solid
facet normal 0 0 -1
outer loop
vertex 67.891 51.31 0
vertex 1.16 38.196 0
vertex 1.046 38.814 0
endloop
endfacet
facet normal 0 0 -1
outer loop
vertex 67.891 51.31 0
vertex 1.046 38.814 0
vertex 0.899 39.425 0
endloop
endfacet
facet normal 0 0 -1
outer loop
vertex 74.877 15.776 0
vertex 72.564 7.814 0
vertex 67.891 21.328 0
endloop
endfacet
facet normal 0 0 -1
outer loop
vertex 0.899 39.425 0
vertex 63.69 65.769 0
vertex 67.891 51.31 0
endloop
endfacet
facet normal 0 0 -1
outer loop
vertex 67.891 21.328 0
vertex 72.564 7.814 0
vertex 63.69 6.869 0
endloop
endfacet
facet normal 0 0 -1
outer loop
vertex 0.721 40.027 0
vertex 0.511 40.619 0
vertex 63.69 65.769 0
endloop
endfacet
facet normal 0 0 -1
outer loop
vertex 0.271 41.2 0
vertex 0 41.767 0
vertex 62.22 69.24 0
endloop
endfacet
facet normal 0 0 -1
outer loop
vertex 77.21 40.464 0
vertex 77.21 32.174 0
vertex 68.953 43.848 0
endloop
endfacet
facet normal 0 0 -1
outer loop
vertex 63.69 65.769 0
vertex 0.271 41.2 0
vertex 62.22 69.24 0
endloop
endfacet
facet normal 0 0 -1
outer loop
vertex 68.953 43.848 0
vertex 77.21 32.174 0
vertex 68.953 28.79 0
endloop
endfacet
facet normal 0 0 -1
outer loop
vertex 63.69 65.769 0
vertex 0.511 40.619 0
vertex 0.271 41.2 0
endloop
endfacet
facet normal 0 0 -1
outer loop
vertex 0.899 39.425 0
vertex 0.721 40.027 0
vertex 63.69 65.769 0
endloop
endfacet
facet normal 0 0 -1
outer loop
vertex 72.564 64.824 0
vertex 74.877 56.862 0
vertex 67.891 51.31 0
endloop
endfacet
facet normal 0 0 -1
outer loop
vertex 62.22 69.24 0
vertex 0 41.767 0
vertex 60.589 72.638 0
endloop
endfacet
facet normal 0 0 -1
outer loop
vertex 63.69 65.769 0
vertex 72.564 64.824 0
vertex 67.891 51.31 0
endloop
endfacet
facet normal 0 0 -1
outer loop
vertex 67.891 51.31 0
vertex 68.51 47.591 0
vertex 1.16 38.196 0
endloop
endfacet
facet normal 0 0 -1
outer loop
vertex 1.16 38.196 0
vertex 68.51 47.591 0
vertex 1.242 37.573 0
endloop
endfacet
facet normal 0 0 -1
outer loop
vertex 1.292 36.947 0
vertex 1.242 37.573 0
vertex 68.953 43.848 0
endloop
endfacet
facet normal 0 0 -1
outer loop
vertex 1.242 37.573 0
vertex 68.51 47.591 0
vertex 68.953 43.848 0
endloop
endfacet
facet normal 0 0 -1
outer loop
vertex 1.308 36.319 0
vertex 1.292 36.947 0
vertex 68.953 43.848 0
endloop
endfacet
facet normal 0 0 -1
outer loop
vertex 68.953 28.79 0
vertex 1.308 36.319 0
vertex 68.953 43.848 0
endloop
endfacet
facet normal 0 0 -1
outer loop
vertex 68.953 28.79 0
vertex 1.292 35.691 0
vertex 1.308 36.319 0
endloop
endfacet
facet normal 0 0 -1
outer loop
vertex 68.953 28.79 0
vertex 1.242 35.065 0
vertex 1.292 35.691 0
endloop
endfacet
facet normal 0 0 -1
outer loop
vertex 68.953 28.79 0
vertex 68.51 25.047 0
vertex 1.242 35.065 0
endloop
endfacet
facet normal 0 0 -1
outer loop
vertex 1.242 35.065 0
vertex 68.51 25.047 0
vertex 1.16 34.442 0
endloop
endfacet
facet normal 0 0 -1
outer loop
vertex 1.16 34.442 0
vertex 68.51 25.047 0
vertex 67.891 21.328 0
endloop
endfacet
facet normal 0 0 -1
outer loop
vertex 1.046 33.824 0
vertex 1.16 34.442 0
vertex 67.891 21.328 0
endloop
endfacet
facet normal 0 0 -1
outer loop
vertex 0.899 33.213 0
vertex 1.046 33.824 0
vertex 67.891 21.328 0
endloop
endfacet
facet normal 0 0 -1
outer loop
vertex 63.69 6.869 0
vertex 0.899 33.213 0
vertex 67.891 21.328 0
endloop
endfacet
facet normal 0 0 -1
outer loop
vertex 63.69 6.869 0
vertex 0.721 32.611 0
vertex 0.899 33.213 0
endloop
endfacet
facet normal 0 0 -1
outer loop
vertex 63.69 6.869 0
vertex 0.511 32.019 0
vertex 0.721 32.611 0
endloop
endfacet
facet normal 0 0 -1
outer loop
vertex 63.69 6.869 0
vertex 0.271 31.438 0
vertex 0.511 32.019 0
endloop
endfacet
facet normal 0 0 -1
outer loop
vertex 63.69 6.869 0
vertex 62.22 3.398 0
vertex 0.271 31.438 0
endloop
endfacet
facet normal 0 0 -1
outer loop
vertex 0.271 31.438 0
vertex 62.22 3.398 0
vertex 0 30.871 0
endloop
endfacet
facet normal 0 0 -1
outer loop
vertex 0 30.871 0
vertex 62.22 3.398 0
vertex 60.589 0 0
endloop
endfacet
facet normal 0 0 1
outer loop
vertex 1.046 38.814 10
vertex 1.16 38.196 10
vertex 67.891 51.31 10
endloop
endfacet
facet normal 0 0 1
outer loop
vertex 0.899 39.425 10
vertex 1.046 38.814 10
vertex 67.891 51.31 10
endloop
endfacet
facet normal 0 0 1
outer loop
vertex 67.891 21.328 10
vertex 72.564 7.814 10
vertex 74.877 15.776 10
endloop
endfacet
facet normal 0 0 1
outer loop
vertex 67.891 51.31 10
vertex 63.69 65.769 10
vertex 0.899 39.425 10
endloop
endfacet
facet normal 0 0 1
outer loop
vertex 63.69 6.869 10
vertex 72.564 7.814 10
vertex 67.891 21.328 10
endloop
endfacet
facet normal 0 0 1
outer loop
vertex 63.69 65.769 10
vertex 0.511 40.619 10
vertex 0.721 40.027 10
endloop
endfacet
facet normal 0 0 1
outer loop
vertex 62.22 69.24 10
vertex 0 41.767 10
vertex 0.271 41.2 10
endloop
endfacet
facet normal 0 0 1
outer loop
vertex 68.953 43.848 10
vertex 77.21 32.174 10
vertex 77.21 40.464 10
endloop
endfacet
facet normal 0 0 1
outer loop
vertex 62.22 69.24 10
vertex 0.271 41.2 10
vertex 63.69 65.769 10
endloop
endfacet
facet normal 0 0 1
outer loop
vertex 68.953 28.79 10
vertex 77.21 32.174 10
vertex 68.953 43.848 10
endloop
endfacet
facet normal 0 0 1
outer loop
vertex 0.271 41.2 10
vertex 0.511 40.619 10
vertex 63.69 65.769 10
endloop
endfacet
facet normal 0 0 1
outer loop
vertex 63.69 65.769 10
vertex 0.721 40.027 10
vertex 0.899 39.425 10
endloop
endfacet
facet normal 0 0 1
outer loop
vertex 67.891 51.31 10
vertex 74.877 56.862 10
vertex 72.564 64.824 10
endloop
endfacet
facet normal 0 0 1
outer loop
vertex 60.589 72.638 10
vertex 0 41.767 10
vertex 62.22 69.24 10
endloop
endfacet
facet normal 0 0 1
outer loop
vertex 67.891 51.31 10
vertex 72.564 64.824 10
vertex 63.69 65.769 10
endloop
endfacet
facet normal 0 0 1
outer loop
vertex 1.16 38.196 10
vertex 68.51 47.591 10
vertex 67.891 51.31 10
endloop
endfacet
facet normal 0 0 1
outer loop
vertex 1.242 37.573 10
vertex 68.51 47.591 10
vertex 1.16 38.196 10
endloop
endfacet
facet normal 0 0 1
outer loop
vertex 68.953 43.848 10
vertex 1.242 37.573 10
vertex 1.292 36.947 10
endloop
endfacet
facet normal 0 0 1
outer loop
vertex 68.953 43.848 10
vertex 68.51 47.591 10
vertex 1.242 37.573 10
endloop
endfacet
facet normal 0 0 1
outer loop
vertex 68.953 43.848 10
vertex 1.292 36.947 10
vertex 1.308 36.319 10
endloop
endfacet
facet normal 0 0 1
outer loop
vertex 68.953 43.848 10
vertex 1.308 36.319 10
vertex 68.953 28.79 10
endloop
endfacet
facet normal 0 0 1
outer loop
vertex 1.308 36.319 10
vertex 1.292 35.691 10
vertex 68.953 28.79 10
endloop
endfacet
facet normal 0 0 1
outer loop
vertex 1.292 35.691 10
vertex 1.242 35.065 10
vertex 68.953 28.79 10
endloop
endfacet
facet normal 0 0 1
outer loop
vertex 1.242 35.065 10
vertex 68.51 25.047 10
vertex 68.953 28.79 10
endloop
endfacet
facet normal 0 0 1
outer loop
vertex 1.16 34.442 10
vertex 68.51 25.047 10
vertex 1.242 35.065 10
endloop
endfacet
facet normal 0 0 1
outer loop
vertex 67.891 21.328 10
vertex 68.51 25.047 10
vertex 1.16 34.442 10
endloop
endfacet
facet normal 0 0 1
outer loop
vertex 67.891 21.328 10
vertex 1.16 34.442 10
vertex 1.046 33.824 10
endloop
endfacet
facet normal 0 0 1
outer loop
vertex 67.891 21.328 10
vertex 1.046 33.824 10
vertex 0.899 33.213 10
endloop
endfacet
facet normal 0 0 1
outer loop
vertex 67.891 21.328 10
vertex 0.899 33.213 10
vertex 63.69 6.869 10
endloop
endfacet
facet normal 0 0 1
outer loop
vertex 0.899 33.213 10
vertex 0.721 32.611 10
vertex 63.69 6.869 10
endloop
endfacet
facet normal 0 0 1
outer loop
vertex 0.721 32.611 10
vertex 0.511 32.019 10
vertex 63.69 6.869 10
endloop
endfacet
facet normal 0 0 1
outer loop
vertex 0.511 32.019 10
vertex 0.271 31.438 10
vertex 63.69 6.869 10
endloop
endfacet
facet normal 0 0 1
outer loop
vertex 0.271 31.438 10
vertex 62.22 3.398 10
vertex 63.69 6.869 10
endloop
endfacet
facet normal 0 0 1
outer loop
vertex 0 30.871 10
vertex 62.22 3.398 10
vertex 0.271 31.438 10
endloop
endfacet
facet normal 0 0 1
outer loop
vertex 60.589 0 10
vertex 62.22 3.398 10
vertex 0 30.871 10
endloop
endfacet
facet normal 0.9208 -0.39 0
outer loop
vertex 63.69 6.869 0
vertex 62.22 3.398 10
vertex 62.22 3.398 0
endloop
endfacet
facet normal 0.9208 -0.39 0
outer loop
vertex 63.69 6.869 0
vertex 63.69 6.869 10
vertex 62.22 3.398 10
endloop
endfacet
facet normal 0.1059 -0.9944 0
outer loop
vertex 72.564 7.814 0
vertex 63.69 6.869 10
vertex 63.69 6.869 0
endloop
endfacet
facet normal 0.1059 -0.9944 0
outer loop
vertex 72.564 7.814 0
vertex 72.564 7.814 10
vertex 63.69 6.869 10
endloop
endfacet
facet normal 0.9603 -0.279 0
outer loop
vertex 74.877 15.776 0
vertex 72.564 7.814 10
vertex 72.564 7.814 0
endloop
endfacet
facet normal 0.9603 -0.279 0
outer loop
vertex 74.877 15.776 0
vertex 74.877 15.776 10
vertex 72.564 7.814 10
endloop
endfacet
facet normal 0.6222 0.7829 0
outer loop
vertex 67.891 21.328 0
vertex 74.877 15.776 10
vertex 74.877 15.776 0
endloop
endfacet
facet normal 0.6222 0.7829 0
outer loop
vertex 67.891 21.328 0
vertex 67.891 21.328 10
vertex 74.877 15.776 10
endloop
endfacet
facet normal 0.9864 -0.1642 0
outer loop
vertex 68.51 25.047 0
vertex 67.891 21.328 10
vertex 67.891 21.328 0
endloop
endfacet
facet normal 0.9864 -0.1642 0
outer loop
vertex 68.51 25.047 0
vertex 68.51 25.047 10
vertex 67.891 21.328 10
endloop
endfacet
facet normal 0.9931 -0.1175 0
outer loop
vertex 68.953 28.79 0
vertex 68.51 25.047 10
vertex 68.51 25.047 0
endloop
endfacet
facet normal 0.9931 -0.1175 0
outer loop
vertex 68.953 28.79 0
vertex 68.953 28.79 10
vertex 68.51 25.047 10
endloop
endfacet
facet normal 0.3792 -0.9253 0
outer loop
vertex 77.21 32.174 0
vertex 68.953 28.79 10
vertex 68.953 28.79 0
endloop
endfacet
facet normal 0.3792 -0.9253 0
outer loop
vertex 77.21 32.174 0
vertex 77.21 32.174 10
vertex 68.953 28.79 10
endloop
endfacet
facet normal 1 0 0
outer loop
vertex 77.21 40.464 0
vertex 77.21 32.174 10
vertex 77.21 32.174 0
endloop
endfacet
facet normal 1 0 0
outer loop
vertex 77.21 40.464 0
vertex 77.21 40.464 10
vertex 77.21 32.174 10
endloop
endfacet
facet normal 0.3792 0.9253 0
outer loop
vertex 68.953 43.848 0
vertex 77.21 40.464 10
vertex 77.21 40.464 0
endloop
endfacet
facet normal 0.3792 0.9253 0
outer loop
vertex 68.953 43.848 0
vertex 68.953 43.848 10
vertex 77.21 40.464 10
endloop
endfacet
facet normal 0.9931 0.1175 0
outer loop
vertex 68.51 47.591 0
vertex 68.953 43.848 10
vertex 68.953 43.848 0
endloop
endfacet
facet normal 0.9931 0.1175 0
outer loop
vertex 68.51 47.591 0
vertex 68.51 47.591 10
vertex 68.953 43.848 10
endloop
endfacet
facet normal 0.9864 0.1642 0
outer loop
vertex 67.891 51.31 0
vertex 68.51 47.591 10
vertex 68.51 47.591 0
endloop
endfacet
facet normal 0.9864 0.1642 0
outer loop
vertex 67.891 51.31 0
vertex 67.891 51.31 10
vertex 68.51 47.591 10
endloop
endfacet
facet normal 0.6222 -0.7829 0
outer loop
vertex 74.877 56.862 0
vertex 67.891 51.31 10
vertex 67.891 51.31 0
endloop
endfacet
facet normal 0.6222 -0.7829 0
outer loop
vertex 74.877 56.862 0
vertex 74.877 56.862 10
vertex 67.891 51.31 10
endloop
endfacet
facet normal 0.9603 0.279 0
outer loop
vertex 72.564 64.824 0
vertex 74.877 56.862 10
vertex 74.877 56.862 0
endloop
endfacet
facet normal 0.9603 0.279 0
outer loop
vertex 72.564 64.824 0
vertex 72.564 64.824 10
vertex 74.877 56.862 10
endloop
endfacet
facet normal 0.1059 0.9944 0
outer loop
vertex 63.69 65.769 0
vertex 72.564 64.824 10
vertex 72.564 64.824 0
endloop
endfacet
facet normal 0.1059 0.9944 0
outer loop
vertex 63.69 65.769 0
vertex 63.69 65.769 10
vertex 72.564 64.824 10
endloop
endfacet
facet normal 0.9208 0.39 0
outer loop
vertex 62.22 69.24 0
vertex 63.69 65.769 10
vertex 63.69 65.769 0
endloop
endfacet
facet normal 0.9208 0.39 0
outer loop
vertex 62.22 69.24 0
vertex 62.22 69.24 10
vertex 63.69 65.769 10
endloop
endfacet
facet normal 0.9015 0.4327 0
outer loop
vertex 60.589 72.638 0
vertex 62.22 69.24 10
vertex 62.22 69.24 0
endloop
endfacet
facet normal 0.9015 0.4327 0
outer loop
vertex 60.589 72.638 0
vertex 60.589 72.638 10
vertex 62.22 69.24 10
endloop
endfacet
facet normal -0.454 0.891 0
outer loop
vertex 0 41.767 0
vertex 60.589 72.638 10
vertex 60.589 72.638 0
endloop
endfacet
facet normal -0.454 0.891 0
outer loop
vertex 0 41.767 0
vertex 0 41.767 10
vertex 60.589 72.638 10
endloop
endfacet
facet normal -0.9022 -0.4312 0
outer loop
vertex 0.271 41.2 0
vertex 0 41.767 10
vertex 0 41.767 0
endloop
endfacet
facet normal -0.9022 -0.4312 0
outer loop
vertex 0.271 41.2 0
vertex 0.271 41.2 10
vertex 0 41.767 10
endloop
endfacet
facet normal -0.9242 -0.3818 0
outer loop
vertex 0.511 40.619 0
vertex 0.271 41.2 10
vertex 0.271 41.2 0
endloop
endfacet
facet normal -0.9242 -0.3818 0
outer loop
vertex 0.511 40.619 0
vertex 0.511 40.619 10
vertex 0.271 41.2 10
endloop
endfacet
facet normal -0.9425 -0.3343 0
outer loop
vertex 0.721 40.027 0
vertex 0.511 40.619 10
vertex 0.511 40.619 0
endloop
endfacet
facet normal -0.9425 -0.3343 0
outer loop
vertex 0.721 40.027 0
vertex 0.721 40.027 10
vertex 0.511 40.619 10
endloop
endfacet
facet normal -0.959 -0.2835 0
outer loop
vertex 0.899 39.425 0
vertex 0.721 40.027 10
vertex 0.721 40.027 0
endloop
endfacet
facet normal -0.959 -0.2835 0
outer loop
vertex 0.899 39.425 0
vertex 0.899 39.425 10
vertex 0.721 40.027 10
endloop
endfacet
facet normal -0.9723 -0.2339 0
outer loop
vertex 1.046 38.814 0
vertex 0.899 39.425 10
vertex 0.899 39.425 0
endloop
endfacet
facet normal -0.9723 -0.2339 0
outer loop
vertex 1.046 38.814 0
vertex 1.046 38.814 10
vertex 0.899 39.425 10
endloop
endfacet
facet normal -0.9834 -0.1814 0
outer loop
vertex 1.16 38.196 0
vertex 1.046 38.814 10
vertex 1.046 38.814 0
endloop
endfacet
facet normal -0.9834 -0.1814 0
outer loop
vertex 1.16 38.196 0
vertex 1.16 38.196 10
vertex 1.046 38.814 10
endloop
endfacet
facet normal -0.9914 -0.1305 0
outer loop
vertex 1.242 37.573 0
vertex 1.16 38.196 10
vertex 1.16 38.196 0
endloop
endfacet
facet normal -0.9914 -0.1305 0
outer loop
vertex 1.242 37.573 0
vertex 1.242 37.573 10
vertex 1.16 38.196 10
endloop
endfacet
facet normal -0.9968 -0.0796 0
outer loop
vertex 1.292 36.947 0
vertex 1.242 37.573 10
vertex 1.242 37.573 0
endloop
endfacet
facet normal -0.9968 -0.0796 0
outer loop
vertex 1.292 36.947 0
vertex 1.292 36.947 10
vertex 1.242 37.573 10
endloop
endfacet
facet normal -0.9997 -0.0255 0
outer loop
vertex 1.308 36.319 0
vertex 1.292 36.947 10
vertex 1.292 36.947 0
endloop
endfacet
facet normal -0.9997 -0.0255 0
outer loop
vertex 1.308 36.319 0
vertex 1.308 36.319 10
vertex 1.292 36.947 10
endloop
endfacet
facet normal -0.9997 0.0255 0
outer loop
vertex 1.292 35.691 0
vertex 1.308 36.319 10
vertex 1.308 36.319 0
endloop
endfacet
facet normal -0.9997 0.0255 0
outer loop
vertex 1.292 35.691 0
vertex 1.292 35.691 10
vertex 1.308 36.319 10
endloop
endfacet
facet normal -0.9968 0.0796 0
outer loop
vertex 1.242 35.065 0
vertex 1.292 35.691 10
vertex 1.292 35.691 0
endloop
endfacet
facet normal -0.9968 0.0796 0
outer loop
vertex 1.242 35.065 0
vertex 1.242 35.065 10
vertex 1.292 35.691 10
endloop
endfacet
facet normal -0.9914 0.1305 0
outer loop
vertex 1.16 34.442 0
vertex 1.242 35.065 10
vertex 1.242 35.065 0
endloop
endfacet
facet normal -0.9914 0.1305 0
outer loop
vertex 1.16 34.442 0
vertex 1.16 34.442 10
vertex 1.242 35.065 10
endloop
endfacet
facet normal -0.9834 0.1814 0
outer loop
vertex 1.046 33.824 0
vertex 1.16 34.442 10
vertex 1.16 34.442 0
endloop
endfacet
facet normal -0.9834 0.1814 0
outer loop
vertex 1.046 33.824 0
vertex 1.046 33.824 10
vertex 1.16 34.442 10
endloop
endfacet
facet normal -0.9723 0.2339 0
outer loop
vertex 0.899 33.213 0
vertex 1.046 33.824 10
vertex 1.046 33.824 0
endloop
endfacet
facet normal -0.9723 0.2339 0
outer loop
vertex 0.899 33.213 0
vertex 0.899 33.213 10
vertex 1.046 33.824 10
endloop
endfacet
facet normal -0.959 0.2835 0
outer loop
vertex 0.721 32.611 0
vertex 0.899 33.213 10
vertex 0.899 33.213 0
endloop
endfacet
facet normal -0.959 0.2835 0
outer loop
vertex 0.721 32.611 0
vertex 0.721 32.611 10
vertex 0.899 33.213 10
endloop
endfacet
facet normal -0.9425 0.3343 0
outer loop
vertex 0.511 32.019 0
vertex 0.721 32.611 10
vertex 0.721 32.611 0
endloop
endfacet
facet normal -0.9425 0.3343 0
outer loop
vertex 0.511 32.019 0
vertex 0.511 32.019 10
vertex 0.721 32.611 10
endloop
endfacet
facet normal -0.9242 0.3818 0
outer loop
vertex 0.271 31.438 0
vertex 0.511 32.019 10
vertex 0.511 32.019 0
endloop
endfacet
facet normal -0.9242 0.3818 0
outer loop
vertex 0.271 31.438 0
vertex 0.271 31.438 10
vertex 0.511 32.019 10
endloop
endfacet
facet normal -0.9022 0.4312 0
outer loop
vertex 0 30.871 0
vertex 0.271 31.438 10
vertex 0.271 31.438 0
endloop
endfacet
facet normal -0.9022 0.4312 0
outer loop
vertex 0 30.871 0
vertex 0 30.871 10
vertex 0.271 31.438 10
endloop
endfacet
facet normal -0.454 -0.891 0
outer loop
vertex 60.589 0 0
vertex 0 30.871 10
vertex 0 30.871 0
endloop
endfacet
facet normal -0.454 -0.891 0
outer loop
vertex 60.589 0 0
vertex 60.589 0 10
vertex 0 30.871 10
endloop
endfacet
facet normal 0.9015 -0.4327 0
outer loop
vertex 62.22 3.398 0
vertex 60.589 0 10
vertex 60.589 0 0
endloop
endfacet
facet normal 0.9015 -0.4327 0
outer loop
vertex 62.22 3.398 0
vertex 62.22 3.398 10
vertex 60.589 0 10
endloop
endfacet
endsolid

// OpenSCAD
$fn = 32;

// ----------------------------------------------------------------------
// Gear sector: 3 teeth on 54 degrees
// ----------------------------------------------------------------------

// --- parameters (mm) ---
sector_angle = 54;        // sector angle, degrees
root_r = 80;              // root circle radius
tooth_h = 8;              // tooth height over the root circle
teeth = 3;                // number of teeth on the sector
hub_r = 12;               // hub bore radius
plate_t = 10;             // sector thickness, Z
arc_step = 3;             // sampling step of the root/hub arcs, degrees

tip_r = root_r + tooth_h;  // tip circle radius

profile = [[60.589, 0], [62.22, 3.398], [63.69, 6.869], [72.564, 7.814], [74.877, 15.776], [67.891, 21.328], [68.51, 25.047], [68.953, 28.79], [77.21, 32.174], [77.21, 40.464], [68.953, 43.848], [68.51, 47.591], [67.891, 51.31], [74.877, 56.862], [72.564, 64.824], [63.69, 65.769], [62.22, 69.24], [60.589, 72.638], [0, 41.767], [0.271, 41.2], [0.511, 40.619], [0.721, 40.027], [0.899, 39.425], [1.046, 38.814], [1.16, 38.196], [1.242, 37.573], [1.292, 36.947], [1.308, 36.319], [1.292, 35.691], [1.242, 35.065], [1.16, 34.442], [1.046, 33.824], [0.899, 33.213], [0.721, 32.611], [0.511, 32.019], [0.271, 31.438], [0, 30.871]];  // primary outline, 37 points, counter clockwise

// --- the one profile operation ---
linear_extrude(height = plate_t) polygon(points = profile);
